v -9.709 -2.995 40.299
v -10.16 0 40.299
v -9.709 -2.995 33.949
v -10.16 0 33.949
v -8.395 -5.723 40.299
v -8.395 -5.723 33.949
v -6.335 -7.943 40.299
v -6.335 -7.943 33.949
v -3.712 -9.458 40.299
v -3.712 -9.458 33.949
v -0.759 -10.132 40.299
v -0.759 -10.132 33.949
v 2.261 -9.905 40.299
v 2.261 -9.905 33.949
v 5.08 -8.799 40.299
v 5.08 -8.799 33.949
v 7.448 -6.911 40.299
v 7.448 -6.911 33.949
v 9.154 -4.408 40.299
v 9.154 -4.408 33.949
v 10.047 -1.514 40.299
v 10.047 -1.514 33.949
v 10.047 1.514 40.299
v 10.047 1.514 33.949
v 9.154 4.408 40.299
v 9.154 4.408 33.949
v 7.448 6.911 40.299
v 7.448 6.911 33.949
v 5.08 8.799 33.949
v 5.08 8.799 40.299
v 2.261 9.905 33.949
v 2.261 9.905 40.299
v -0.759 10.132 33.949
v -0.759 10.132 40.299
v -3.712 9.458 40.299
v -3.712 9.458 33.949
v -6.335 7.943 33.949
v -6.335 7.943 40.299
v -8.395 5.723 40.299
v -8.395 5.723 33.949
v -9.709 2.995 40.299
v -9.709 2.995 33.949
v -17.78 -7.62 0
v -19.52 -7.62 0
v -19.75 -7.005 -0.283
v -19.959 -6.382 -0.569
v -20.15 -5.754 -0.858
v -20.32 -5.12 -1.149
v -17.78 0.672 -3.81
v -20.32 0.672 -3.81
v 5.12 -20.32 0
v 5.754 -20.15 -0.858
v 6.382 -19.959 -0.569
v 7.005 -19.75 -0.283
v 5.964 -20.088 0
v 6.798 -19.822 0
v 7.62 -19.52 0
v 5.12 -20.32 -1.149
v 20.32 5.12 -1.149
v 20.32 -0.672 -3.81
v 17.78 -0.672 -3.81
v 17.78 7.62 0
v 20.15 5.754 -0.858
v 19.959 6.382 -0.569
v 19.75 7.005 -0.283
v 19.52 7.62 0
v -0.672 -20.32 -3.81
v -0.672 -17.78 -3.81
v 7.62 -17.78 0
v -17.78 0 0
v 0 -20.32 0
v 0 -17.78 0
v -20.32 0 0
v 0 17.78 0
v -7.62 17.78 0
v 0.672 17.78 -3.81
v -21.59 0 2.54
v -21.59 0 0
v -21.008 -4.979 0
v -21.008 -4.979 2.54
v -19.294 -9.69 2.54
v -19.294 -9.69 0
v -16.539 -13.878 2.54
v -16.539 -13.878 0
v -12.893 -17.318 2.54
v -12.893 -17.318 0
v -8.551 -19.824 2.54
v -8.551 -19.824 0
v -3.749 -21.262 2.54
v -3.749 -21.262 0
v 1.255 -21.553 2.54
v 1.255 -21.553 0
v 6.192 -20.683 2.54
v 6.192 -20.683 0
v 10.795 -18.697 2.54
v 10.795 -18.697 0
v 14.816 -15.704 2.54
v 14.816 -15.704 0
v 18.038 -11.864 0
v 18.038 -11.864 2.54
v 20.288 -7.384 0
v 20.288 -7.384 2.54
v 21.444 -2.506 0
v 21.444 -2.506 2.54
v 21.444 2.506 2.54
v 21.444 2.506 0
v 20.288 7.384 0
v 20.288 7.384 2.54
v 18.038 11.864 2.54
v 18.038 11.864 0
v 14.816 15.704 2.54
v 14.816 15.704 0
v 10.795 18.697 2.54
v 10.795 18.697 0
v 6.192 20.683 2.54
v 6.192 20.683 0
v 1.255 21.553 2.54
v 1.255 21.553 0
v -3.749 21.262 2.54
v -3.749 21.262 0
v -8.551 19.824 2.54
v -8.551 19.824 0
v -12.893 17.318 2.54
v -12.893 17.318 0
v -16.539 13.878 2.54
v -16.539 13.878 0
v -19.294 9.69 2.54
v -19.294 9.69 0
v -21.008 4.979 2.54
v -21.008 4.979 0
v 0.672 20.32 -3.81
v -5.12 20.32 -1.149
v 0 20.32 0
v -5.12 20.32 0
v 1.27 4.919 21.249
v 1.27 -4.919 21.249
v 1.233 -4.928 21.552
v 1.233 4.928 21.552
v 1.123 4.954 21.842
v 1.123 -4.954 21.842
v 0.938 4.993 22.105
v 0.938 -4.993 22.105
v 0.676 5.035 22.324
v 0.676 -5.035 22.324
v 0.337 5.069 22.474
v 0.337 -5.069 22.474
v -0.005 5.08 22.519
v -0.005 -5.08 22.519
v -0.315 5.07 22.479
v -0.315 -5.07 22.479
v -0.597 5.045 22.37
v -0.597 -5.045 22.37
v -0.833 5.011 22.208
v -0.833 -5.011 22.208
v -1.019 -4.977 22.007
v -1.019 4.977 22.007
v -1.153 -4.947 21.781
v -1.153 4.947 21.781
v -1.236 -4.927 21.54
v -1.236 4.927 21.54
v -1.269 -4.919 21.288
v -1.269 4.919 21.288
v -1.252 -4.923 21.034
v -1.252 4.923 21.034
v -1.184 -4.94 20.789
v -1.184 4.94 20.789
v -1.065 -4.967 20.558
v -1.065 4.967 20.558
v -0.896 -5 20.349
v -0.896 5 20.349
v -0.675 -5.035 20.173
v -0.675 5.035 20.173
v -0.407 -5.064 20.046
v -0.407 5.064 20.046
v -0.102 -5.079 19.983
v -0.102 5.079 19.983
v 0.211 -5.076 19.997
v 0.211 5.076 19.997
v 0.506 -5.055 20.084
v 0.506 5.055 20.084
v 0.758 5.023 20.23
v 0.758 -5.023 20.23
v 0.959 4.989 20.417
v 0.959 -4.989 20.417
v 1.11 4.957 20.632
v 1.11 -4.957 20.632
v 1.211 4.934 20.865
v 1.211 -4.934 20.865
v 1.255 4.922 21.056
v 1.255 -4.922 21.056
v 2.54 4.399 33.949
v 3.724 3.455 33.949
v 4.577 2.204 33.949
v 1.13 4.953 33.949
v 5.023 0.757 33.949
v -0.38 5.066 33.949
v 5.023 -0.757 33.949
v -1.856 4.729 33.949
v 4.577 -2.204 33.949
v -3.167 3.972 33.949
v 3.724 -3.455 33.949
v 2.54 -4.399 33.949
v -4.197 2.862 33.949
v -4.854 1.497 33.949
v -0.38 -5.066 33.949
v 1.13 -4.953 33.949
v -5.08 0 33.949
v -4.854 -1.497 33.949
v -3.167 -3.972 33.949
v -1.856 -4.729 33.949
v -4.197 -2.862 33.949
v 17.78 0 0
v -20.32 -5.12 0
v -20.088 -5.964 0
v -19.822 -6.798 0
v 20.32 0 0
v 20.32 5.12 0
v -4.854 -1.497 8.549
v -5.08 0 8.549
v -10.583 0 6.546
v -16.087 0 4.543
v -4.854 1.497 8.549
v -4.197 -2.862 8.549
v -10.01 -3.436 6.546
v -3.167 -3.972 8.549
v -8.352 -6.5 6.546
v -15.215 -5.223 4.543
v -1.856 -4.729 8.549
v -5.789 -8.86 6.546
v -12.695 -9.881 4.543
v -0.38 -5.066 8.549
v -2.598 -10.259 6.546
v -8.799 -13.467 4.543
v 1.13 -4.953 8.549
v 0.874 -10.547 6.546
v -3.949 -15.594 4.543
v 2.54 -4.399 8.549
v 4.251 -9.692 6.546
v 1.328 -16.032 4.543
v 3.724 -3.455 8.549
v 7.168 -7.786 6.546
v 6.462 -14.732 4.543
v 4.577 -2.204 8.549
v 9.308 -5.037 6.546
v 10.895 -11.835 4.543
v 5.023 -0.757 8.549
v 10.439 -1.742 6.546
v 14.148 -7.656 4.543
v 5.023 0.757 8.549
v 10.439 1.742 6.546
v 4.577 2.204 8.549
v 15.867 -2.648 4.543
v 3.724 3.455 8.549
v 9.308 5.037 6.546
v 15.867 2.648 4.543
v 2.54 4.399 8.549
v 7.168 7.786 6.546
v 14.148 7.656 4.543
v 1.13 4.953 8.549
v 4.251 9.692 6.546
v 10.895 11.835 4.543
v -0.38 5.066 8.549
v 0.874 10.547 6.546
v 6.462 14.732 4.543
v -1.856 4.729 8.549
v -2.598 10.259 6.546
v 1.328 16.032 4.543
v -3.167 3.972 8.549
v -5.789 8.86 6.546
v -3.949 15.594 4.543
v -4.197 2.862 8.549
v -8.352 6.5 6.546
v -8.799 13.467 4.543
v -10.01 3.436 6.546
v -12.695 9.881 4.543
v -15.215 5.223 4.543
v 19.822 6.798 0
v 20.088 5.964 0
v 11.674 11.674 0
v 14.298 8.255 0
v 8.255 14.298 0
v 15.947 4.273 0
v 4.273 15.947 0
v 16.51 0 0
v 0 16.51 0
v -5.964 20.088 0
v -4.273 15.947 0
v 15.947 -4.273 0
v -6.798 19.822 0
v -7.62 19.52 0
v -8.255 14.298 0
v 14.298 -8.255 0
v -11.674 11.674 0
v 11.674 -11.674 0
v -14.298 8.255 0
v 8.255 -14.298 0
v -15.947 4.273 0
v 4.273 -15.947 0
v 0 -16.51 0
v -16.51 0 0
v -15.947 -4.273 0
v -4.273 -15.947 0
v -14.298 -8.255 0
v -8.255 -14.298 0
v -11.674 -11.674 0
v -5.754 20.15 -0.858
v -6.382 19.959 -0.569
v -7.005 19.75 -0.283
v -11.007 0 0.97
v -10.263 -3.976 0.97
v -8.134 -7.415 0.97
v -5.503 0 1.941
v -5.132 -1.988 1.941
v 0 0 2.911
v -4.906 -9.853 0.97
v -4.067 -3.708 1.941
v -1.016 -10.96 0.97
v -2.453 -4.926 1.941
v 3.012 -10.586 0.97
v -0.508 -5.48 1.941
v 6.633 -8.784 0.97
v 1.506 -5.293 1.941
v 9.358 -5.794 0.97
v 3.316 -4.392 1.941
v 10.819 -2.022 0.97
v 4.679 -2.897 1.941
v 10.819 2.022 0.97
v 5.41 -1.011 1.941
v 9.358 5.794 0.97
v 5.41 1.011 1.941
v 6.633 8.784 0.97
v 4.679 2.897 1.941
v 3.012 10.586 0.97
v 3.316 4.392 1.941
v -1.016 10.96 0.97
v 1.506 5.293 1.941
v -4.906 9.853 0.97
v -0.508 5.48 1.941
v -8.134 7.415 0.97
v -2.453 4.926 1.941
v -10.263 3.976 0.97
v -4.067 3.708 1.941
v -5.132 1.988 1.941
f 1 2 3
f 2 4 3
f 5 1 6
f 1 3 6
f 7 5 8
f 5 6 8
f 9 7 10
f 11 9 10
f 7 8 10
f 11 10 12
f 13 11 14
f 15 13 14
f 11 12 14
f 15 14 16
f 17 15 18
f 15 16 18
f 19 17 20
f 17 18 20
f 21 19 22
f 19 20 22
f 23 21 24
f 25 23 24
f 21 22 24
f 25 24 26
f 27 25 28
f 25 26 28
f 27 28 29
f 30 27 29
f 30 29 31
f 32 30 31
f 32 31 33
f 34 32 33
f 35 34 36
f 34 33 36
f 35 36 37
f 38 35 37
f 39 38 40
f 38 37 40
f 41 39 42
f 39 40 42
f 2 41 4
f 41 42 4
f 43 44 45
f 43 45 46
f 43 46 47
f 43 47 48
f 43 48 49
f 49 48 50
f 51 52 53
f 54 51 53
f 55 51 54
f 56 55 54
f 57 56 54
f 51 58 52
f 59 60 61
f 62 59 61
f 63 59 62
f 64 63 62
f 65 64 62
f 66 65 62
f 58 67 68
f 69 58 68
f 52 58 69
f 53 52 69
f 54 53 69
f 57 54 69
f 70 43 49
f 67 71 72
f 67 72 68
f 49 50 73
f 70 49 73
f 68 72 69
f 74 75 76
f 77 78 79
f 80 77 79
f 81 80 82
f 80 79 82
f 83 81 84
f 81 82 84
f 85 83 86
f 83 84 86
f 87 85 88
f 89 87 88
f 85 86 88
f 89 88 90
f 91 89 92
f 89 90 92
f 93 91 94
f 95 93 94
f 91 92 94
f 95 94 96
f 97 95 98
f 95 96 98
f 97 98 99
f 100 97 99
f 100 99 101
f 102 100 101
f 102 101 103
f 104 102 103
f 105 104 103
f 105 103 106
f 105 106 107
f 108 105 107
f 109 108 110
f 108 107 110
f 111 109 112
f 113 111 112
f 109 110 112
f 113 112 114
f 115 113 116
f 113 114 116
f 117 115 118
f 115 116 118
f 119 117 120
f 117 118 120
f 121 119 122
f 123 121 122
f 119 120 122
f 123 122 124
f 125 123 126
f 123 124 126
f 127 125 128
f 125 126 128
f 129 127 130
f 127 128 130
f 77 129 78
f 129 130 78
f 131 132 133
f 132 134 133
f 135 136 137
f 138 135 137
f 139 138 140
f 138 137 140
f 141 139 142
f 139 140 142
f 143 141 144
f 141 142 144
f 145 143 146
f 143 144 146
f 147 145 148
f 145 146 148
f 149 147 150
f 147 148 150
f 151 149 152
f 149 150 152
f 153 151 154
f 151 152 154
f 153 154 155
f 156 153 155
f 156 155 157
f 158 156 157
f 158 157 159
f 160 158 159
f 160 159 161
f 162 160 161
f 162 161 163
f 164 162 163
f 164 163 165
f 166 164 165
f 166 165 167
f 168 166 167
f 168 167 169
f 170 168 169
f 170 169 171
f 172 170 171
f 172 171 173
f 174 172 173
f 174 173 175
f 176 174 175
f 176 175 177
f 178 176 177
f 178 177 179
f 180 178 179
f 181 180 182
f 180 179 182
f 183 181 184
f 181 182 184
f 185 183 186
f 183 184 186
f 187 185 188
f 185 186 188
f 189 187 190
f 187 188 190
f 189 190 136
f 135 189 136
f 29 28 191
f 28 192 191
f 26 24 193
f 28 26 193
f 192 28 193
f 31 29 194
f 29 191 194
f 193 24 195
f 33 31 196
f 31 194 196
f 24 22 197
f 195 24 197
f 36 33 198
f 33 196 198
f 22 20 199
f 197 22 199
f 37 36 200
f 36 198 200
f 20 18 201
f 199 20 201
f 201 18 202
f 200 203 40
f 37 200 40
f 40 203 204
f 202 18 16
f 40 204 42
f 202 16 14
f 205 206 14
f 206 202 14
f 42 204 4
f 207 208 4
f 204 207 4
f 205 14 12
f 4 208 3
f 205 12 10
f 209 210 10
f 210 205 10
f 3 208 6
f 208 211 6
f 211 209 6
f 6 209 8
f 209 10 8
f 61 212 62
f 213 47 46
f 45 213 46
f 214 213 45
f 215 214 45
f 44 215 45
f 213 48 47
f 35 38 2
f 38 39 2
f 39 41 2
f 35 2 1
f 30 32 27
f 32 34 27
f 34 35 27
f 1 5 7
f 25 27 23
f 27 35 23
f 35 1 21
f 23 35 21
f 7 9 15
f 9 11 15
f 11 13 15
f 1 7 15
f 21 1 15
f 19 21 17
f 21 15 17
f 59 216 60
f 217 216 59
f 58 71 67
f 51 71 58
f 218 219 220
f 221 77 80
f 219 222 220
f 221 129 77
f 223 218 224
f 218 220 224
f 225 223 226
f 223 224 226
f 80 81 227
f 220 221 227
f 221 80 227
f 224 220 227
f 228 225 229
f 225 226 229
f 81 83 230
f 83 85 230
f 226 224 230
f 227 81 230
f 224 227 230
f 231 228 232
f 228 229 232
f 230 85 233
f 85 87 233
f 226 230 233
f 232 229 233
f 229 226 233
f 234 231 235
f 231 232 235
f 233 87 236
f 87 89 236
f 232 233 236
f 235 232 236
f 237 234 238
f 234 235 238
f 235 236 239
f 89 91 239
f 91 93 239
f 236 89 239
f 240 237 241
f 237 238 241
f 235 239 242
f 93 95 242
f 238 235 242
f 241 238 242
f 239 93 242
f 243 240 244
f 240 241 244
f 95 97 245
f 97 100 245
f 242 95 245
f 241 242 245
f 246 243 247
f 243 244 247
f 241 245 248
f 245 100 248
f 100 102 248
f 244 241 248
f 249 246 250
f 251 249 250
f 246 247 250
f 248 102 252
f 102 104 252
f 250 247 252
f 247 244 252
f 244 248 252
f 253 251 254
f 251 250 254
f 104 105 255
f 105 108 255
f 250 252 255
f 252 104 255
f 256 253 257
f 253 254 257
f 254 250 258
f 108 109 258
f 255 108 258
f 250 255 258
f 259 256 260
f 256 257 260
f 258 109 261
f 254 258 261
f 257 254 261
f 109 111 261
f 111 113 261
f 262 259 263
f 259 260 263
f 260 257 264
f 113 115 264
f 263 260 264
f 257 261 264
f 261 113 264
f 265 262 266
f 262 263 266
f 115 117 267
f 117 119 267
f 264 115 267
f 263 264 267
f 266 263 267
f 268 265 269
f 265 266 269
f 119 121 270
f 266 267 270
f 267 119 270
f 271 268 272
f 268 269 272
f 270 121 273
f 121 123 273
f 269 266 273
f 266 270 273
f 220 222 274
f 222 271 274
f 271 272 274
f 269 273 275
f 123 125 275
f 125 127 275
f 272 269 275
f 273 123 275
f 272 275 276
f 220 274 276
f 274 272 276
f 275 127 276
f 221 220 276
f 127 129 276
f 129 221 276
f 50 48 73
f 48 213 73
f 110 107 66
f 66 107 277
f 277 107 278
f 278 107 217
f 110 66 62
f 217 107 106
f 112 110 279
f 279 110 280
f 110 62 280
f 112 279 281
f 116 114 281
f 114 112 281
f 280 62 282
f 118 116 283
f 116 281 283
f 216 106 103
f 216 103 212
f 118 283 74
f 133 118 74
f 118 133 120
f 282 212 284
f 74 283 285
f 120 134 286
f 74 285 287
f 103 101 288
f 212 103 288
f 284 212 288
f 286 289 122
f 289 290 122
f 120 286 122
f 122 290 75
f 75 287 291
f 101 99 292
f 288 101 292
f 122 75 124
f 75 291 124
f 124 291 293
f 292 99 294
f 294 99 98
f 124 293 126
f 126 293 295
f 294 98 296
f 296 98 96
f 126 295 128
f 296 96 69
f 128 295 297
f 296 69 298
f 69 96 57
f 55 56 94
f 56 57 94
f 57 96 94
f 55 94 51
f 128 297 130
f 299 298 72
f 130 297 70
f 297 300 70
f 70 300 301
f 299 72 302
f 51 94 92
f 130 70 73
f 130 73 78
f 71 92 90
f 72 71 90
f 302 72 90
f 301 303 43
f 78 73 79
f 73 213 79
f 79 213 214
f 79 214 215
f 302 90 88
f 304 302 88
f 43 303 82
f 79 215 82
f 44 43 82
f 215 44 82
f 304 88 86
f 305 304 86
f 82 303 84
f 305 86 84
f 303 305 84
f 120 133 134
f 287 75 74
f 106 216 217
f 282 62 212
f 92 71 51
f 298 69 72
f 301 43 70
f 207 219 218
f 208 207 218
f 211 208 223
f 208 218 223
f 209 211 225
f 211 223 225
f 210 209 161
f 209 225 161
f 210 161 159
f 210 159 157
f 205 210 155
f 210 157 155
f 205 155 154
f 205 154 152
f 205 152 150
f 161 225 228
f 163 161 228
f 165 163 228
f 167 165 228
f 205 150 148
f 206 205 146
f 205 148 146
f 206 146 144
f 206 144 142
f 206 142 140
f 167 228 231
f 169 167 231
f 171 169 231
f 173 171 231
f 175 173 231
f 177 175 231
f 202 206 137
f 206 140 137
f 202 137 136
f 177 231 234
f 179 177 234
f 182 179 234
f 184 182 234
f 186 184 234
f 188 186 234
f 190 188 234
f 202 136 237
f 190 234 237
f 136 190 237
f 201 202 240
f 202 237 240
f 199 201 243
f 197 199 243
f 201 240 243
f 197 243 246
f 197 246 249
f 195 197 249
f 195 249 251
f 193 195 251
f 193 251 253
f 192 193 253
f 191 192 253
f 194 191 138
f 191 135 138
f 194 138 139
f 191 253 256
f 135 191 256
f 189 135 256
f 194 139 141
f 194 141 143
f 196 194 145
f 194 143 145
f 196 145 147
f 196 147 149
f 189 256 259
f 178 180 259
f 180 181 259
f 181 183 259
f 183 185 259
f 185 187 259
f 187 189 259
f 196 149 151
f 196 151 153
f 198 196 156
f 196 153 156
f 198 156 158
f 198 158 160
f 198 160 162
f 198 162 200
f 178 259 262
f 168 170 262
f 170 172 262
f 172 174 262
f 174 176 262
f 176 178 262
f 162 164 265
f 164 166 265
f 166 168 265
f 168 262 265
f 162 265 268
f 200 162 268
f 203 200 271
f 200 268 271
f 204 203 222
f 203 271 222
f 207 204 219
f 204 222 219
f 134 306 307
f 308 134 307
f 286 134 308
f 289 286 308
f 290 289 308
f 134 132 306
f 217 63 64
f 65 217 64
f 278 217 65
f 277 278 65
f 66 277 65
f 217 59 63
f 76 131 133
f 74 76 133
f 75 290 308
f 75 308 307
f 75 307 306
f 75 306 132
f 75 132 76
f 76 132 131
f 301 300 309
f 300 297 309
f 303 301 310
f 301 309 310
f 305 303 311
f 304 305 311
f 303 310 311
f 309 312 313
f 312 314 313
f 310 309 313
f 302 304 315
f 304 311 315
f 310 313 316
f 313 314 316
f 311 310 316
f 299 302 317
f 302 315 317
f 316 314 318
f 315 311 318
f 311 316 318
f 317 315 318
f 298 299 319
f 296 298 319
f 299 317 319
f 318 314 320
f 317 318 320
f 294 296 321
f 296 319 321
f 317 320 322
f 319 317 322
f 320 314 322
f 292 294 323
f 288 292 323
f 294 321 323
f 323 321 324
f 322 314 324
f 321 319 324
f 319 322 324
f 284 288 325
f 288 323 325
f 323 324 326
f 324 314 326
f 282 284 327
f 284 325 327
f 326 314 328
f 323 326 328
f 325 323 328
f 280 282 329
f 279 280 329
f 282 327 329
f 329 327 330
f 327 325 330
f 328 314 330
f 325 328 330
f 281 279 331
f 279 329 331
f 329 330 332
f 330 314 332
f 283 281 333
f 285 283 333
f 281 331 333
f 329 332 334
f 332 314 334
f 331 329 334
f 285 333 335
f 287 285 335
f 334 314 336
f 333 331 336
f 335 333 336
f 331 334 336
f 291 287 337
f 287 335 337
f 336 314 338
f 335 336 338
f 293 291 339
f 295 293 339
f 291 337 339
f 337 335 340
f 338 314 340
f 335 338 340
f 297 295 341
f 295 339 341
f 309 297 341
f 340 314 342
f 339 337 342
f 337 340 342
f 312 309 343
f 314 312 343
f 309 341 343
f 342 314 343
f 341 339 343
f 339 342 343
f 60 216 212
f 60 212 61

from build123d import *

# Parameters (mm, degrees)
F5_DEPTH  = 2.54
F7_DEPTH  = 2.54
F9_DEPTH  = 2.54
F11_DEPTH = 2.54
F14_R     = 1.27
F15_DEPTH = 30.0736
F16_R     = 42.413221
F16_R_2   = 20.955
F17_DEPTH = 25.4


with BuildPart() as f5:
    # F4 (on offset) → F5 (new body)
    with BuildSketch(Plane.YZ.offset(20.32)):
        Polygon((7.62, 0), (0, 0), (-0.671806, -3.81), align=None)
    extrude(amount=-F5_DEPTH)



with BuildPart() as f7:
    # F6 (on offset) → F7 (new body)
    with BuildSketch(Plane.YZ.offset(-20.32)):
        Polygon((0.671806, -3.81), (0, 0), (-7.62, 0), align=None)
    extrude(amount=F7_DEPTH)


with BuildPart() as f9:
    # F8 (on offset) → F9 (new body)
    with BuildSketch(Plane.XZ.offset(-20.32)):
        Polygon((0.671806, -3.81), (0, 0), (-7.62, 0), align=None)
    extrude(amount=F9_DEPTH)


with BuildPart() as f11:
    # F10 (on offset) → F11 (new body)
    with BuildSketch(Plane.XZ.offset(20.32)):
        Polygon((7.62, 0), (0, 0), (-0.671806, -3.81), align=None)
    extrude(amount=-F11_DEPTH)


with BuildPart() as f5_1:
    add(f5.part)

    add(f7.part)  # F13 merges F7

    add(f9.part)  # F13 merges F9

    add(f11.part)  # F13 merges F11
    # F12 (on Front) → F13 (revolve)
    with BuildSketch(Plane.XZ):
        Polygon((-21.59, 0), (-16.51, 0), (0, 2.911158), (0, 40.299149), (-10.16, 40.299149), (-10.16, 33.949149), (-5.08, 33.949149), (-5.08, 8.549149), (-21.59, 2.54), align=None)
    revolve(axis=Axis((0, 0, 23.632418), (0, 0, 1)))

    # F14 (on offset) → F15 (cut)
    with BuildSketch(Plane.XZ.offset(20.32)):
        with Locations((0, 21.249149)):
            Circle(F14_R)
    extrude(amount=-F15_DEPTH, mode=Mode.SUBTRACT)

    # F16 (on Top) → F17 (cut)
    with BuildSketch(Plane.XY):
        Circle(F16_R)
        Circle(F16_R_2, mode=Mode.SUBTRACT)
    extrude(amount=-F17_DEPTH, mode=Mode.SUBTRACT)


solid = f5_1.part
